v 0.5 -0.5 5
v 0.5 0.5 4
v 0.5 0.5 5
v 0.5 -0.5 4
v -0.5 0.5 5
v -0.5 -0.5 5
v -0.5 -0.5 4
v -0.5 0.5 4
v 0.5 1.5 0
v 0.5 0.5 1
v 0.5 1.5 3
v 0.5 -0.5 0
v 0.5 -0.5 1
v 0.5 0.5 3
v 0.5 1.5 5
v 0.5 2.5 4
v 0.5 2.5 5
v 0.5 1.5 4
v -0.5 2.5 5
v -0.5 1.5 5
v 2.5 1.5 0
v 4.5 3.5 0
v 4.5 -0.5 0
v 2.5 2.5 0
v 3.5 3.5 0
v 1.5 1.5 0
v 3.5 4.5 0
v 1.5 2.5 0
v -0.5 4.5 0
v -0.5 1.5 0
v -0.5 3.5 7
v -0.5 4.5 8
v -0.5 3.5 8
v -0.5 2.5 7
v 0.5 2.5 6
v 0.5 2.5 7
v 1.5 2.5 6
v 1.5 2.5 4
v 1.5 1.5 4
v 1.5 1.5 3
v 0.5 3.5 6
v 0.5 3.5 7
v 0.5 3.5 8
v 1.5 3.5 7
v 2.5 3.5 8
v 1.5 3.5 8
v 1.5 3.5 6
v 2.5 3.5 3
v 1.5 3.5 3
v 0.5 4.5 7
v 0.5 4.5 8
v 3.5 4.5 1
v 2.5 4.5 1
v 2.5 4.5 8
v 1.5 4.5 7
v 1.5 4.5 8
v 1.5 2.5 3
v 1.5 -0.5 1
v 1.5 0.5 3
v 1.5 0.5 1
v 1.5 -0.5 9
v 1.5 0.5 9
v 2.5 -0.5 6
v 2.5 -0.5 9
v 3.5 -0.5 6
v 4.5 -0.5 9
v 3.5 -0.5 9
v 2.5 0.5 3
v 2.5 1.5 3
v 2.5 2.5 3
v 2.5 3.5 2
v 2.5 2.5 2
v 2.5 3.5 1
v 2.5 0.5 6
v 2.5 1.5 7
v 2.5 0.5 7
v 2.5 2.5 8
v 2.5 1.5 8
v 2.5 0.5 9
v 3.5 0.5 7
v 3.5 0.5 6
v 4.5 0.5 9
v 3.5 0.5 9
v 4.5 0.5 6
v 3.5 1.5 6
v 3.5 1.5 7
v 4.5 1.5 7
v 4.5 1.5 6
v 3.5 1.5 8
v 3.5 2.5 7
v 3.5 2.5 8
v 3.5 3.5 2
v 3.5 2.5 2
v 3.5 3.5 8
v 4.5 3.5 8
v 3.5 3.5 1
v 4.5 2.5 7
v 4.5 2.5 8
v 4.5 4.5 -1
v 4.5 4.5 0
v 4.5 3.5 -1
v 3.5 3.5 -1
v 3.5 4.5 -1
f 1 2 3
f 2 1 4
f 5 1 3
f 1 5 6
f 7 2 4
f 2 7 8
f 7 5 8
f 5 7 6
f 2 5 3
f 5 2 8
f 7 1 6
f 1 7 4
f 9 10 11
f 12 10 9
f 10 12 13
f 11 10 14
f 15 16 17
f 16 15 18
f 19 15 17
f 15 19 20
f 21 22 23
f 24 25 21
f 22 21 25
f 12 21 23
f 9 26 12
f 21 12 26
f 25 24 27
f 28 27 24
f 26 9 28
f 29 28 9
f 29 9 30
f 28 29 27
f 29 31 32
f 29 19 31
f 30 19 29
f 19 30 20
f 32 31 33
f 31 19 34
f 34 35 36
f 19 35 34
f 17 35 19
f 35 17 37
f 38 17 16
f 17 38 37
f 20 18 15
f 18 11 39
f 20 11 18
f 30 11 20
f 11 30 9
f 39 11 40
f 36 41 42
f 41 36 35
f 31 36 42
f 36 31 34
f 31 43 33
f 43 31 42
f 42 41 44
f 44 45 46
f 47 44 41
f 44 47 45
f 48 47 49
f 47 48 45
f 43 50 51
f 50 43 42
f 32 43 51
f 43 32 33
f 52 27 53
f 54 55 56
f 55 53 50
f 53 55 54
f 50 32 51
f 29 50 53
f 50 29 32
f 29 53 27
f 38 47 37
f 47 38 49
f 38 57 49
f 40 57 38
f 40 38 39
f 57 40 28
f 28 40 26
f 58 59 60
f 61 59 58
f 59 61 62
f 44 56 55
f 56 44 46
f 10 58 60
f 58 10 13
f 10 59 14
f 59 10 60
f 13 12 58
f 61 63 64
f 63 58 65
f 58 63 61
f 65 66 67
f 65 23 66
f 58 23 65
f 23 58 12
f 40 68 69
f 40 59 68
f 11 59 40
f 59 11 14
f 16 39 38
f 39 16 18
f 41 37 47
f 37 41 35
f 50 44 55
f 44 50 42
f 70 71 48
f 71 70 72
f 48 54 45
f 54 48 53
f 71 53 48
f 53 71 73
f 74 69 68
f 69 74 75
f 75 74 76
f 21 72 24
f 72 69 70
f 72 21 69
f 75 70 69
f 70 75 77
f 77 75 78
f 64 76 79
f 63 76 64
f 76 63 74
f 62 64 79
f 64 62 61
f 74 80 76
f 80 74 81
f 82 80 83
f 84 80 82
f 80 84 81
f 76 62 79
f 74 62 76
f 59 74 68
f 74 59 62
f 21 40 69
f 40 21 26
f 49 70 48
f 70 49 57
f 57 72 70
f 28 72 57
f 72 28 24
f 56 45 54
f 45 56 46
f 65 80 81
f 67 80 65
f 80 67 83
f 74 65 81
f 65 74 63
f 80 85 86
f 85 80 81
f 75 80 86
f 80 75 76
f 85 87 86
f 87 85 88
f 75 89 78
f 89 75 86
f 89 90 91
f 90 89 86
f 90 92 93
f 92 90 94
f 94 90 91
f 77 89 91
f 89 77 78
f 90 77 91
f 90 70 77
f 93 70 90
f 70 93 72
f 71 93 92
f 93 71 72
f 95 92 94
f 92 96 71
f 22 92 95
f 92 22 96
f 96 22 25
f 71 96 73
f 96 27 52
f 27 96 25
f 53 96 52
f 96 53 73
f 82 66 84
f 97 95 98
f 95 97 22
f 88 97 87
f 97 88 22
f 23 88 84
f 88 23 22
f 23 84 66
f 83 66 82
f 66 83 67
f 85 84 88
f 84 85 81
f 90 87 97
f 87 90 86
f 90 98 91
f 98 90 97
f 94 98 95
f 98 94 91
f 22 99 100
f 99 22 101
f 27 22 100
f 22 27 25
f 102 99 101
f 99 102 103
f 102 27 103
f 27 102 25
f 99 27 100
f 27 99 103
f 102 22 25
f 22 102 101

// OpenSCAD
union() {
    translate([0, 0, 4.5]) color([1, 0, 0]) cube([1, 1, 1], center=true);
    translate([0, 2, 2.5]) cube([1, 1, 5], center=true);
    translate([0, 3, 3.5]) cube([1, 1, 7], center=true);
    translate([0, 4, 4.0]) cube([1, 1, 8], center=true);
    translate([1, 0, 0.5]) cube([1, 1, 1], center=true);
    translate([1, 1, 1.5]) cube([1, 1, 3], center=true);
    translate([1, 2, 2.0]) cube([1, 1, 4], center=true);
    translate([1, 3, 3.0]) cube([1, 1, 6], center=true);
    translate([1, 4, 3.5]) cube([1, 1, 7], center=true);
    translate([2, 0, 4.5]) cube([1, 1, 9], center=true);
    translate([2, 1, 1.5]) cube([1, 1, 3], center=true);
    translate([2, 3, 1.5]) cube([1, 1, 3], center=true);
    translate([2, 4, 4.0]) cube([1, 1, 8], center=true);
    translate([3, 0, 3.0]) cube([1, 1, 6], center=true);
    translate([3, 1, 3.5]) cube([1, 1, 7], center=true);
    translate([3, 2, 4.0]) cube([1, 1, 8], center=true);
    translate([3, 3, 1.0]) cube([1, 1, 2], center=true);
    translate([3, 4, 0.5]) cube([1, 1, 1], center=true);
    translate([4, 0, 4.5]) cube([1, 1, 9], center=true);
    translate([4, 1, 3.0]) cube([1, 1, 6], center=true);
    translate([4, 2, 3.5]) cube([1, 1, 7], center=true);
    translate([4, 3, 4.0]) cube([1, 1, 8], center=true);
    translate([4, 4, -0.5]) color([0, 0, 1]) cube([1, 1, 1], center=true);
}
